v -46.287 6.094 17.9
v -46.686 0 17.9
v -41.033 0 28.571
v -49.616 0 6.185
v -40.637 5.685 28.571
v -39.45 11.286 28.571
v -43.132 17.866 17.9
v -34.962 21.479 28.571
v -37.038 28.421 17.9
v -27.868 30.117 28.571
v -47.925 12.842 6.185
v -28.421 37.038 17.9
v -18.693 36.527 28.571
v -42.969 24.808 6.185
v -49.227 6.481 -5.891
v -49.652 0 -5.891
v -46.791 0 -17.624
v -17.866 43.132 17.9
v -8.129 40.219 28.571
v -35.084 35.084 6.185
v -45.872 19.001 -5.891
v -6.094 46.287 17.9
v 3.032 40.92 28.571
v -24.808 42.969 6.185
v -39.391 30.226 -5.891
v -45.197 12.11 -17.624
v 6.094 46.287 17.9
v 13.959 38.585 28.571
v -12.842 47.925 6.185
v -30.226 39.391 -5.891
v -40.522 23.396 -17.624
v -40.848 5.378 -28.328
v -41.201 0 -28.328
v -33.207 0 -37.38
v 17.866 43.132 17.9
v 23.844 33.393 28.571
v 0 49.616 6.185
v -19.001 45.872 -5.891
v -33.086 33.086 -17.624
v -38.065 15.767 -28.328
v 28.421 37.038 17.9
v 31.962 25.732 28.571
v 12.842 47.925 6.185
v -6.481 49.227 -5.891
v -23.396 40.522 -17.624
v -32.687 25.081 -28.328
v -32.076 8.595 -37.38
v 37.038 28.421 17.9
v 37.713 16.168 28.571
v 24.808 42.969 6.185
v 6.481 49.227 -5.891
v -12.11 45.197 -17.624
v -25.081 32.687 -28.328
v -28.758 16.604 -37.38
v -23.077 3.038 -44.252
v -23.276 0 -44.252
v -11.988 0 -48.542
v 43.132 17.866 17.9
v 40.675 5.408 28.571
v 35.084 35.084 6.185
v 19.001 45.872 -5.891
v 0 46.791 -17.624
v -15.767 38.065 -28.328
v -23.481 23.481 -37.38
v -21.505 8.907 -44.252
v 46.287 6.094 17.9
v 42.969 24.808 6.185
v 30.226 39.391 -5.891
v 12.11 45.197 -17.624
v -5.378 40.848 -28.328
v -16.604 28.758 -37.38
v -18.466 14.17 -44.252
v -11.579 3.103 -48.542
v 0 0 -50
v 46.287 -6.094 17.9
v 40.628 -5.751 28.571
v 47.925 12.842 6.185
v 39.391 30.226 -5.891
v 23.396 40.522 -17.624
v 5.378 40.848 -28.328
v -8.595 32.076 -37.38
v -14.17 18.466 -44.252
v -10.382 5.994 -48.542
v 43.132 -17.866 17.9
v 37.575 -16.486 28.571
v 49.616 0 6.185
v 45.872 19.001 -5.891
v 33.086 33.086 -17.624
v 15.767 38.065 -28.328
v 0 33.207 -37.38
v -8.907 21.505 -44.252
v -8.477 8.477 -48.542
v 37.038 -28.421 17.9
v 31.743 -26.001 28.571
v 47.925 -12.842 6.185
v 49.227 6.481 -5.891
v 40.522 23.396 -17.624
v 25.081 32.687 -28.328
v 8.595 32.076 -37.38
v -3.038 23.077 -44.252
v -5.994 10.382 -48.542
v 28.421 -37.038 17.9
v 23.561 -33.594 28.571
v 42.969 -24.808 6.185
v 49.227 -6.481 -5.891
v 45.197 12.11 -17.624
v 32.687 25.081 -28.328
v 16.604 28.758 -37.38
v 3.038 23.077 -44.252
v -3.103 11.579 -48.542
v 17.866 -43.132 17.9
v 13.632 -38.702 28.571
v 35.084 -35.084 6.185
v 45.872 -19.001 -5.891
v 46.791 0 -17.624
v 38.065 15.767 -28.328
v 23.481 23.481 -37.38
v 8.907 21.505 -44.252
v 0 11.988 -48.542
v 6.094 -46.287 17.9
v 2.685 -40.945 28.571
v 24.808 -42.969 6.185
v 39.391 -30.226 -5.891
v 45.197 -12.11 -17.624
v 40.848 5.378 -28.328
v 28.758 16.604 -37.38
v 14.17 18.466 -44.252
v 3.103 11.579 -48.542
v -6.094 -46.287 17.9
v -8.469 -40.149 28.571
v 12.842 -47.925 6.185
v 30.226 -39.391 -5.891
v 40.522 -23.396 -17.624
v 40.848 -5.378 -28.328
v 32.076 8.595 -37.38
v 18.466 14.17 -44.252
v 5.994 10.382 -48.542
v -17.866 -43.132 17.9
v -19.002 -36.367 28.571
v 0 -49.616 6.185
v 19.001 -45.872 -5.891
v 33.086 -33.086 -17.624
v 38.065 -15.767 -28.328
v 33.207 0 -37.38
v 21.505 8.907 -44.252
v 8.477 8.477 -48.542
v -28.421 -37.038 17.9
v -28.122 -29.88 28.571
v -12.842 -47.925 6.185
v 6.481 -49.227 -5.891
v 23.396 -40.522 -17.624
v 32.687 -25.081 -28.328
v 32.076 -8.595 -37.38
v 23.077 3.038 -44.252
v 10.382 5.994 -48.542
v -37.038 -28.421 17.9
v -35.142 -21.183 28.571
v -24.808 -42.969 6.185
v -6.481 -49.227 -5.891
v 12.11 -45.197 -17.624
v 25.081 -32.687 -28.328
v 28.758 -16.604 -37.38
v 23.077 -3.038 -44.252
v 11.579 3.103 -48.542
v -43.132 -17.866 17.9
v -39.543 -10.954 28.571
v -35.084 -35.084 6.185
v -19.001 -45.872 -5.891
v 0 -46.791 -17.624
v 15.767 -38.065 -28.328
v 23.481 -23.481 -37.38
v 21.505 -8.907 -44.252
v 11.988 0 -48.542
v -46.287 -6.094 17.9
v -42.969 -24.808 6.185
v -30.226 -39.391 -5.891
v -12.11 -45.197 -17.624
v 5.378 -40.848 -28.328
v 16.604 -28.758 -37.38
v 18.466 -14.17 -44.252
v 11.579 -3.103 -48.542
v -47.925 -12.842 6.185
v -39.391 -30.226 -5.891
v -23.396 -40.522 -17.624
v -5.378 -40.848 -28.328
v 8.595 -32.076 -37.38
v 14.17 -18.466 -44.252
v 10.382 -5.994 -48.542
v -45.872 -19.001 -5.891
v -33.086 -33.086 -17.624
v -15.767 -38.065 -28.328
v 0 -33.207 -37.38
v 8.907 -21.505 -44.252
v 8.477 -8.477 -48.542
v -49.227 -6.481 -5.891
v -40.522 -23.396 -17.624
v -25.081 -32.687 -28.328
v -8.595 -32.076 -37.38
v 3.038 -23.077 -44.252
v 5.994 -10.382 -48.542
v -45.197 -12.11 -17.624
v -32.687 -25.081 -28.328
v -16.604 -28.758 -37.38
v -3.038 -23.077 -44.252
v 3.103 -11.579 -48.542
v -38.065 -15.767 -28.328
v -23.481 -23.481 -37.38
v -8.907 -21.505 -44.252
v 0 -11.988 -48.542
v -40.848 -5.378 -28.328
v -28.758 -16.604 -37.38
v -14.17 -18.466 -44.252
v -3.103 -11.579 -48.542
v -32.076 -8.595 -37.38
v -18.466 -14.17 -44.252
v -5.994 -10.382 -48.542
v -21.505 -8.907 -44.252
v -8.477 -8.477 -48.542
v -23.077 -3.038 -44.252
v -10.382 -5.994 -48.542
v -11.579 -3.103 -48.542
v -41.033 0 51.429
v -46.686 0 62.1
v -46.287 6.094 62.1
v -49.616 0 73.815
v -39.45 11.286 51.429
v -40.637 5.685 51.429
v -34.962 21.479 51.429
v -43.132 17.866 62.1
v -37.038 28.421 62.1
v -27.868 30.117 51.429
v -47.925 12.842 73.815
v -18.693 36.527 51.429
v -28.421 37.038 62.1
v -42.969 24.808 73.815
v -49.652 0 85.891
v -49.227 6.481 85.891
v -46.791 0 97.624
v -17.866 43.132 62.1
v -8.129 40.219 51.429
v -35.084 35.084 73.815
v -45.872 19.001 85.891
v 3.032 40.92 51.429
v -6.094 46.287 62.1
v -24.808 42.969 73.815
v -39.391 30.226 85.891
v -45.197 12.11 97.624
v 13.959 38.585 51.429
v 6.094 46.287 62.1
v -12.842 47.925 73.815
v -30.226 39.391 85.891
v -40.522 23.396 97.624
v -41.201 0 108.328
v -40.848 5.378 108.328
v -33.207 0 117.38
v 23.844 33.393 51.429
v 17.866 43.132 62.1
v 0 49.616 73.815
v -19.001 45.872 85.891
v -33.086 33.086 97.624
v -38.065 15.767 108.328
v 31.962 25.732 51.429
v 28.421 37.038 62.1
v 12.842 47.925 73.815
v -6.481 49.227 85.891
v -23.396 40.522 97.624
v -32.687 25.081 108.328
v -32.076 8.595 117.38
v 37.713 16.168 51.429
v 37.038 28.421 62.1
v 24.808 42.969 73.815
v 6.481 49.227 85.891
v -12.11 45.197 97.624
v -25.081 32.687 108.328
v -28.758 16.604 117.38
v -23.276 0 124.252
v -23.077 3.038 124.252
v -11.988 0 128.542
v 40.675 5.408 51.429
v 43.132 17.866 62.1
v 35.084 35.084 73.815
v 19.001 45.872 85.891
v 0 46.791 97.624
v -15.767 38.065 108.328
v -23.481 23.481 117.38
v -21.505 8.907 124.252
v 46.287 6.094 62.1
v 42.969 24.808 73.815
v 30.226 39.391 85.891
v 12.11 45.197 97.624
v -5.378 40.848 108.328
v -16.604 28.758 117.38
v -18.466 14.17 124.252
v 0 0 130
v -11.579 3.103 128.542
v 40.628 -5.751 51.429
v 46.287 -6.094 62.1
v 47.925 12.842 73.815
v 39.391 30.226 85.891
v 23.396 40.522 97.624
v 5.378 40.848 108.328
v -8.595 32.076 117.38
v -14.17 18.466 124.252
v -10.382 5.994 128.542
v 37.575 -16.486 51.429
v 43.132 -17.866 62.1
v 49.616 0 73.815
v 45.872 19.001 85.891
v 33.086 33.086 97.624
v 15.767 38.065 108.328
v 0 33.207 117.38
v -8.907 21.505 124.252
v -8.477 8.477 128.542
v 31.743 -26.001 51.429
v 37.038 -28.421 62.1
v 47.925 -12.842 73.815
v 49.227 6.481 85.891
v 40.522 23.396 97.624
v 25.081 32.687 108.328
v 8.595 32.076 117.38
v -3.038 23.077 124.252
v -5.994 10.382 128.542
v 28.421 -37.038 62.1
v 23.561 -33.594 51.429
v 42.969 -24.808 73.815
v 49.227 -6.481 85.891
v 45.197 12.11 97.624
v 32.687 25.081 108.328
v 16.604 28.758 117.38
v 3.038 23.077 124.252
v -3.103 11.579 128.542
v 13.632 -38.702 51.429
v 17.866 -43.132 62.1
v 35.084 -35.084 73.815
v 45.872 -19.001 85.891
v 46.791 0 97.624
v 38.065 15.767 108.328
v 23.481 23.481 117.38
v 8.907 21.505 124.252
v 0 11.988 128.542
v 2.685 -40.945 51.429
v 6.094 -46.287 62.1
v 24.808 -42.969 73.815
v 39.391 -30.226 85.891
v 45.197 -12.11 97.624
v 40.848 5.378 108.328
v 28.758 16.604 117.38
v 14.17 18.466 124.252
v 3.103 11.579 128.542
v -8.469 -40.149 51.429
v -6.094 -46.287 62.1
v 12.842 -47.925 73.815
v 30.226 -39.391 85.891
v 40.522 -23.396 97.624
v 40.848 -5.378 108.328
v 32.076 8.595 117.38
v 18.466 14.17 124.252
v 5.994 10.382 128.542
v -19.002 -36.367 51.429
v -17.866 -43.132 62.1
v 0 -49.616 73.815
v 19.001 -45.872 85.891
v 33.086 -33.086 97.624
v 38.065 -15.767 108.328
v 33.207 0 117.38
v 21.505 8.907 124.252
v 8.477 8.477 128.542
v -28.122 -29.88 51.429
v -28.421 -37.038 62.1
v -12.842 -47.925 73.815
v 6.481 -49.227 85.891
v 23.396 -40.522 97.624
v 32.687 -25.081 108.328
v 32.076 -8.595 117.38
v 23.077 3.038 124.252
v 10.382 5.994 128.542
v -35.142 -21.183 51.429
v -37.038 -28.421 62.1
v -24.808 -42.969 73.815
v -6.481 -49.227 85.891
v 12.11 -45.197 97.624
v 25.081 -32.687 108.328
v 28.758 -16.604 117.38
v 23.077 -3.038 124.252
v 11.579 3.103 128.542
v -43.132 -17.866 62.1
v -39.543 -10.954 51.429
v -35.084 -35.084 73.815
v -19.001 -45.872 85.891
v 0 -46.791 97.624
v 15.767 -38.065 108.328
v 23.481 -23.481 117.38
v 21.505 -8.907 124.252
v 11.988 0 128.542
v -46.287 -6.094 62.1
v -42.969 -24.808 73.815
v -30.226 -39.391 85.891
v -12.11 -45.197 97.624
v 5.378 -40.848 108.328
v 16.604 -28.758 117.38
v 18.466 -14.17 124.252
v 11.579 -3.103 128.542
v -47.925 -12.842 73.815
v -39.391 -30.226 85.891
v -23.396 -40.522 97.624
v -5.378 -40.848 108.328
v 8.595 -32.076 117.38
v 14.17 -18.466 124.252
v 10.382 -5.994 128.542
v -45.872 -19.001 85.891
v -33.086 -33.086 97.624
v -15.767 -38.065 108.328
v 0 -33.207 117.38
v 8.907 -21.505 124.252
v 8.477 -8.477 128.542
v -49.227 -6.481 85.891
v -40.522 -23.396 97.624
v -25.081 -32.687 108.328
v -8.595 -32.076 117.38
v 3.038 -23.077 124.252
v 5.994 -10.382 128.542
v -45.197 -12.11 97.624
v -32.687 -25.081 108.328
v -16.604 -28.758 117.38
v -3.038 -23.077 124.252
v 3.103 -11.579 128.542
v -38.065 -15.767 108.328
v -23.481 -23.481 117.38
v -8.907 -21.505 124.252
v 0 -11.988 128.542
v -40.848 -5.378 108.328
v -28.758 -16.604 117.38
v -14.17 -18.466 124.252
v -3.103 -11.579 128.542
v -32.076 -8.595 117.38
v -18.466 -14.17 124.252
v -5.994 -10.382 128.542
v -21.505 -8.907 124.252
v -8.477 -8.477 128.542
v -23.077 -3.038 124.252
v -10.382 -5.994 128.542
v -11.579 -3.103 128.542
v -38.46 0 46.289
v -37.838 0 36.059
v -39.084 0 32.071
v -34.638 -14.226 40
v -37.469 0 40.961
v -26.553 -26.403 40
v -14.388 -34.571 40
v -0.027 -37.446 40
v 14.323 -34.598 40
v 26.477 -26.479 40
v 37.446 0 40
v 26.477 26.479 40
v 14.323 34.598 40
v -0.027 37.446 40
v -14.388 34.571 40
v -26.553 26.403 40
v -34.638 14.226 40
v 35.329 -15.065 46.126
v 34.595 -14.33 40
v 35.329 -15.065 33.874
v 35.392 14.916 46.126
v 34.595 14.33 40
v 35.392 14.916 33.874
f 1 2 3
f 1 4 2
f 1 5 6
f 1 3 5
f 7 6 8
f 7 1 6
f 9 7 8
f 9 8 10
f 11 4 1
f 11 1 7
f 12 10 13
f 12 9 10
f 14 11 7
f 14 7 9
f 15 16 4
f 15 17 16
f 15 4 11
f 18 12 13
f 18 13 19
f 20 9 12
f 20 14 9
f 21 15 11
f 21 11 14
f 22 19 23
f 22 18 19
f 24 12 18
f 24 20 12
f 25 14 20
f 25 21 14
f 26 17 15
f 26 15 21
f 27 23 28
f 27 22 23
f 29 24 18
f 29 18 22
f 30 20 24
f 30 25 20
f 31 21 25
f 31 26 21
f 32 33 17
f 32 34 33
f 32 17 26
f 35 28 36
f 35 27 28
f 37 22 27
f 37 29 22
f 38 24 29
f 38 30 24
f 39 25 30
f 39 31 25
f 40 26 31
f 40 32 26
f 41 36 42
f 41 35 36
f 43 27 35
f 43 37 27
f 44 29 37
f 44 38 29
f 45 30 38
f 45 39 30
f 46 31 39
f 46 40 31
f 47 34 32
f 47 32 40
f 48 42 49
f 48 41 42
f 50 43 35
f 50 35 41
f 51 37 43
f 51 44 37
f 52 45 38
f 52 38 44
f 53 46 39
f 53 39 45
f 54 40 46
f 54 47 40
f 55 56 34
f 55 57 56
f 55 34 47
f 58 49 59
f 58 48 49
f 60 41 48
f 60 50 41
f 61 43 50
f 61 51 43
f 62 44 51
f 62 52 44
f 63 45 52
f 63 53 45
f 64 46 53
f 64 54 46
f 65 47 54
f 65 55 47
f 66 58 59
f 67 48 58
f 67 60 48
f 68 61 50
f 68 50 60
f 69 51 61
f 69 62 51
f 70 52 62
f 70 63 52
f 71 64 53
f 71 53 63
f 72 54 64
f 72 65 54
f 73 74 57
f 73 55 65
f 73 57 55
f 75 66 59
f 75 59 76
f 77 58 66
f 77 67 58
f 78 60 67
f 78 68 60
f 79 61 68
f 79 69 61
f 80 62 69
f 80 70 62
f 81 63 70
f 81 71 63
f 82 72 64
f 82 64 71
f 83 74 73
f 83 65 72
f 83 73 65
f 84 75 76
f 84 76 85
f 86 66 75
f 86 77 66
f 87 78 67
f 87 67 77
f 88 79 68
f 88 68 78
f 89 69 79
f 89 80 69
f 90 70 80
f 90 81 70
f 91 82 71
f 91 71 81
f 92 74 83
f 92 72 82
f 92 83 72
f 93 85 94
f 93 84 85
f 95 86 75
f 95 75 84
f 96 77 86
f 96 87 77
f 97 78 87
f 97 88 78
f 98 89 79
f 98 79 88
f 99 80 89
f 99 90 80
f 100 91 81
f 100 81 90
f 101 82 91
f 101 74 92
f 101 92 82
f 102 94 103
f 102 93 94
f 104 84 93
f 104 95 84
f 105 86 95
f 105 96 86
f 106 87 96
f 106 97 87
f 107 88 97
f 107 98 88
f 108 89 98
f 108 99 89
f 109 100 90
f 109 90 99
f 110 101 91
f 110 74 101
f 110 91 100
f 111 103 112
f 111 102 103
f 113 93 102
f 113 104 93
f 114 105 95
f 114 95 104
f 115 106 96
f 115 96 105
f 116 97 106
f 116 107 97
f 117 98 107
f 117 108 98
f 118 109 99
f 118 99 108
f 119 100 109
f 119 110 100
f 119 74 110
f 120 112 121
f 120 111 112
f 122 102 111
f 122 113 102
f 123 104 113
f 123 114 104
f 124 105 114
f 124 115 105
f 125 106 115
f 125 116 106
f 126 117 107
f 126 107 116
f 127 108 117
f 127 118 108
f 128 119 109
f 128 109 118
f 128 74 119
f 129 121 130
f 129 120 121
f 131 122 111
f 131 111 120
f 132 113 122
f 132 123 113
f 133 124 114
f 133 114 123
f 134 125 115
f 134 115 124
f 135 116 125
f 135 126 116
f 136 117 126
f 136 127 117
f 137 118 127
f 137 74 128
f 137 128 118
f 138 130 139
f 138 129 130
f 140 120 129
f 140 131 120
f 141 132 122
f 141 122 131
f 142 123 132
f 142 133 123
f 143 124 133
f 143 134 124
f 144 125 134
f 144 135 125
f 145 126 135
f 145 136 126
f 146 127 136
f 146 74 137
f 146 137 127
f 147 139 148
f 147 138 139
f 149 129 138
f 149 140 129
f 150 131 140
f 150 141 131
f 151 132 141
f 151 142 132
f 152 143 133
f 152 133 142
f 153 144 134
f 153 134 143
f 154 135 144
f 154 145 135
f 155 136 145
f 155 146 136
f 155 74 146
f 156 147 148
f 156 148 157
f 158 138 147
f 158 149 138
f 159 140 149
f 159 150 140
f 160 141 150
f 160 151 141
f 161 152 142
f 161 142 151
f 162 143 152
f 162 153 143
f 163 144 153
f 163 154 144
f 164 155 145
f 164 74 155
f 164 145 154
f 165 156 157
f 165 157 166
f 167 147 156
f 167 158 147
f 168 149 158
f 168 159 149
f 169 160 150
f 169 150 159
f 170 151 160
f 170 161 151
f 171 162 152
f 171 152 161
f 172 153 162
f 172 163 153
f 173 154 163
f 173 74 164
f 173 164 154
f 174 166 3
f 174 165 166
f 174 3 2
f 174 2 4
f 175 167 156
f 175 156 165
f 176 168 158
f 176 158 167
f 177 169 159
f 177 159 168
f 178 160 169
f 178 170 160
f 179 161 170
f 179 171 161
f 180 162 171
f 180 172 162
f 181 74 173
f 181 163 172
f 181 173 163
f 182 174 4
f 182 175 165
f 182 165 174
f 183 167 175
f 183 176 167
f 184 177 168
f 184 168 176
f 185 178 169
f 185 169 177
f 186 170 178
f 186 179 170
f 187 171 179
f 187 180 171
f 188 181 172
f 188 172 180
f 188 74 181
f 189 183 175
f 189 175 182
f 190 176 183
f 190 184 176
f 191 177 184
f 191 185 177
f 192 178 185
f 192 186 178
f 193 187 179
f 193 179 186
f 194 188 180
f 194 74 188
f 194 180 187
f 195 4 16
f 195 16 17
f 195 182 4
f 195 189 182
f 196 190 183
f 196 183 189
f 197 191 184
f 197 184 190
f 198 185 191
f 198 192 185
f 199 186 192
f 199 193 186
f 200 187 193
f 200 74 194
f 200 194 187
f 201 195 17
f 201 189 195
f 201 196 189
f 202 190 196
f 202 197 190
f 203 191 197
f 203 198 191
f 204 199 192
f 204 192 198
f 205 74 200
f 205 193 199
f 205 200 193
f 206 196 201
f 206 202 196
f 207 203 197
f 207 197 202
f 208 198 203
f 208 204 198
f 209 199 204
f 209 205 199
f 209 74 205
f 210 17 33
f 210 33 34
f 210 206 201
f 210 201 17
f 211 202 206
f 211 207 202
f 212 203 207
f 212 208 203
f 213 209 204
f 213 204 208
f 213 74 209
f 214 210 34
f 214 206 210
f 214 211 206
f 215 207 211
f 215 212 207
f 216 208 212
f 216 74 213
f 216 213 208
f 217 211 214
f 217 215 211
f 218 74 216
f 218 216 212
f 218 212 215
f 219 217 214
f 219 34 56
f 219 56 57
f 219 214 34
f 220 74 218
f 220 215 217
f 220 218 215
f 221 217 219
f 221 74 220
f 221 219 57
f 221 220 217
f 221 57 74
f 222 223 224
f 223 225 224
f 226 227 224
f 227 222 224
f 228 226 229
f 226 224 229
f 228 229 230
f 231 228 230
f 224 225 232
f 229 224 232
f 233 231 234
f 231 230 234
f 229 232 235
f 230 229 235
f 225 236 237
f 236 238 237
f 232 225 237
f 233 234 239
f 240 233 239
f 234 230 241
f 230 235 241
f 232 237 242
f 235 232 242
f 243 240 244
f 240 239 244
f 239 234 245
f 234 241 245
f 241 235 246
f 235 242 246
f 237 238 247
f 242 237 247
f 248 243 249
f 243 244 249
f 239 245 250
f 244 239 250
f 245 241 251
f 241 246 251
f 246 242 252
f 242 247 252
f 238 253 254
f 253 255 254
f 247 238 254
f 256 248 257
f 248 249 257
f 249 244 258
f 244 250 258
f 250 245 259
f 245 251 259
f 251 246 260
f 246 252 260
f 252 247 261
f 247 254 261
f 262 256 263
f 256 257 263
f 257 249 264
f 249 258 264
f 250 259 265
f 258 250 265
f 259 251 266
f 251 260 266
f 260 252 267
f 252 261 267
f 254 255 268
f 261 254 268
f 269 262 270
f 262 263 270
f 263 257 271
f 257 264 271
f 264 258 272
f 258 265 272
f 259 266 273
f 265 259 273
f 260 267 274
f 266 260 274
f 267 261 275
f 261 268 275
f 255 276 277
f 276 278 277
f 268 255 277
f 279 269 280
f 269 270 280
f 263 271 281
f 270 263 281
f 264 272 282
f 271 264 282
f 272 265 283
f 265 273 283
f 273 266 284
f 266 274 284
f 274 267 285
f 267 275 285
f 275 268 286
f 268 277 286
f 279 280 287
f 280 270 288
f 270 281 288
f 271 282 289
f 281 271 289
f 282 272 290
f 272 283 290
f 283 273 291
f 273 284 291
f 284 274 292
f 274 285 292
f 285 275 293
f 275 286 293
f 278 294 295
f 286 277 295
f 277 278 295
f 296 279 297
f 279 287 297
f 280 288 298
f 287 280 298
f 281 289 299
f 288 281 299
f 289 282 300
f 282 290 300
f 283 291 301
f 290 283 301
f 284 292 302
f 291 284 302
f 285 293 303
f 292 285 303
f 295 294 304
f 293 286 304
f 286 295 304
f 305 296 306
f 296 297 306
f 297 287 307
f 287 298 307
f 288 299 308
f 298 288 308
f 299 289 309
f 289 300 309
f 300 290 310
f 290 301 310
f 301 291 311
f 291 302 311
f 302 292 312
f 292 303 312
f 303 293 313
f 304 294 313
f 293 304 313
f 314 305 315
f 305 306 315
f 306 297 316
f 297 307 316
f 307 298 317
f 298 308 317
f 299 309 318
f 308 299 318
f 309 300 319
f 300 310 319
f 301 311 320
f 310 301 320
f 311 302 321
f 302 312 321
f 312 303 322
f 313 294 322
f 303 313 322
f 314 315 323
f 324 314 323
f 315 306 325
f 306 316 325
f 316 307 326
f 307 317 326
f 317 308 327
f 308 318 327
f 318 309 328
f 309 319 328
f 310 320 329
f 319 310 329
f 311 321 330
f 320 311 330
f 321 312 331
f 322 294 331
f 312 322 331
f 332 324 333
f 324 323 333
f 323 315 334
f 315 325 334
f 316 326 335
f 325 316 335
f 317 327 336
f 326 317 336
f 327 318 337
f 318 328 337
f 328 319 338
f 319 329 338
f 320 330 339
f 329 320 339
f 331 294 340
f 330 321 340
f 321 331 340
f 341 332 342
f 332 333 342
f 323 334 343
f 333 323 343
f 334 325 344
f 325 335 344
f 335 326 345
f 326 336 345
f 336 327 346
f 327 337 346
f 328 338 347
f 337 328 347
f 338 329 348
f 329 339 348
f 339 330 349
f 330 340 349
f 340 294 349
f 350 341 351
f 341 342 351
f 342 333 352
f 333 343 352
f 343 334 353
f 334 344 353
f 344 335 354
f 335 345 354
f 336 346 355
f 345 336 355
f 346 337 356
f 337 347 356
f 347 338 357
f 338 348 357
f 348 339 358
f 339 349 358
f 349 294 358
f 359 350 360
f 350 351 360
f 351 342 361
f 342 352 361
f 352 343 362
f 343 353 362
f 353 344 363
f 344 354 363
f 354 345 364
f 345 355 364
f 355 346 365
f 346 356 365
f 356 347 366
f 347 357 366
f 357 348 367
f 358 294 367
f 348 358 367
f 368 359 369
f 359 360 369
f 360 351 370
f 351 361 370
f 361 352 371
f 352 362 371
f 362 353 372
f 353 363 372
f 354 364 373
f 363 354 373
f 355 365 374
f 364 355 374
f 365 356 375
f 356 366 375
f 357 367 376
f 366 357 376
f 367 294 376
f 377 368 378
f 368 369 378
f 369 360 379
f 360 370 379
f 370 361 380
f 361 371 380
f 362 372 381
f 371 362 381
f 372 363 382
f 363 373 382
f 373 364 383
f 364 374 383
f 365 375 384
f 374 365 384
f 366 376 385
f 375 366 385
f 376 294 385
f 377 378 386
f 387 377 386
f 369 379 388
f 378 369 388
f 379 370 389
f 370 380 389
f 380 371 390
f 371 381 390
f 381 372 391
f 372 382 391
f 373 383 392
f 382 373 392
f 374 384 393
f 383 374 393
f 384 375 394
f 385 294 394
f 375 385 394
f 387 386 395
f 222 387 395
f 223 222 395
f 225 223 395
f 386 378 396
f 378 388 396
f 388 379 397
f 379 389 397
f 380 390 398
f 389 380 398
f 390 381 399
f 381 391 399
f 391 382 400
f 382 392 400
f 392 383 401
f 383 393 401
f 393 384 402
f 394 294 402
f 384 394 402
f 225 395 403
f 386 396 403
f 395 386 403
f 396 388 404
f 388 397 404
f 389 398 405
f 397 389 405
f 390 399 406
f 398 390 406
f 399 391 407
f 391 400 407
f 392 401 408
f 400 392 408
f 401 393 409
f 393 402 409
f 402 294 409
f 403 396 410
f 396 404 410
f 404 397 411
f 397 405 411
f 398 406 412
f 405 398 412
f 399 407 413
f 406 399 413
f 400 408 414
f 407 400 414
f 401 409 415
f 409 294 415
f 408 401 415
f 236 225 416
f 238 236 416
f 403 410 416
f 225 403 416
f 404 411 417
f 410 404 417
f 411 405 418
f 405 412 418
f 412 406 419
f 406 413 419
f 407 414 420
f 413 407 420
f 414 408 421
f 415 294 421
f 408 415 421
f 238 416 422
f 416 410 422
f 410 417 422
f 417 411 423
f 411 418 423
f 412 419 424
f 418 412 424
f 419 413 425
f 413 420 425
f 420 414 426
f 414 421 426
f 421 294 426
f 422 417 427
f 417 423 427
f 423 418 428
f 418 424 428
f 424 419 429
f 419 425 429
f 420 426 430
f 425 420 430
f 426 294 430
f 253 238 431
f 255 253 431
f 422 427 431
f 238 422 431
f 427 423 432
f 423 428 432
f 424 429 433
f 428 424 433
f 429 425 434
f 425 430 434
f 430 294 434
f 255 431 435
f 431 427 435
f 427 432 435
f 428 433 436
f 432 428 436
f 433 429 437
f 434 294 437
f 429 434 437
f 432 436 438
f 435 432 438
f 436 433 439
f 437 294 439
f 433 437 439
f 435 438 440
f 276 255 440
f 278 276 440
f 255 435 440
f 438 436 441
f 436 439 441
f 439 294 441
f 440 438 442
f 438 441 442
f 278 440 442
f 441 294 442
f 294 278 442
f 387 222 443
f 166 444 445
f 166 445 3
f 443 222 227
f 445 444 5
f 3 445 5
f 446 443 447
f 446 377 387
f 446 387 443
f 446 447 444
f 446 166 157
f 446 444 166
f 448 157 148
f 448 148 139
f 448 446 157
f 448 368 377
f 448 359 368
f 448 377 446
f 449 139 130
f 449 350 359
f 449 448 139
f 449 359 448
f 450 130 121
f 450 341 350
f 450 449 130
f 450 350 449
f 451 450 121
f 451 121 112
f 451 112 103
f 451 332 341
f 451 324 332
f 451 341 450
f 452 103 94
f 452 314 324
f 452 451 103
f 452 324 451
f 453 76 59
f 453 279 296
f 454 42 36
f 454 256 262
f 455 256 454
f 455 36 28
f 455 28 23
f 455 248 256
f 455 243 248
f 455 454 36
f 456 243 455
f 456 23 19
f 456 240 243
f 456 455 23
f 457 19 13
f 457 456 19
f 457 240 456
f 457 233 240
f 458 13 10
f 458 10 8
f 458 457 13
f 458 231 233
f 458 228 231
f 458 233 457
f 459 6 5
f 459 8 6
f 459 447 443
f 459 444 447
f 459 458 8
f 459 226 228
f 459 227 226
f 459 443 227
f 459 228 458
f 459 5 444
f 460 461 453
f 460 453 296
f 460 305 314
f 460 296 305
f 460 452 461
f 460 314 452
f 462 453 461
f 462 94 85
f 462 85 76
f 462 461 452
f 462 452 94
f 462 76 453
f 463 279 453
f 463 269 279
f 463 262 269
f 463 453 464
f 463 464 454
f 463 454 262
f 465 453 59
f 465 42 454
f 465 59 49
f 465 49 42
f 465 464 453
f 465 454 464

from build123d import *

# Parameters (mm, degrees)
F4_R = 20


with BuildPart() as f1:
    # F0 (on Front) → F1 (revolve)
    with BuildSketch(Plane.XZ):
        with BuildLine():
            Line((0, -50), (0, 50))
            ThreePointArc((0, 50), (-50, 0), (0, -50))
        make_face()
    revolve(axis=Axis((0, 0, 0), (0, 0, -1)))

    # F3: F1 across plane


with BuildPart() as f1_1:
    add(f1.part)
    add(f1.part.mirror(Plane.XY.offset(40)))

    # F4
    f4_edges = [f1_1.edges().sort_by_distance(p)[0] for p in [
        (30, 0, 40),
        (-47.434165, 0, -15.811388),
    ]]
    fillet(f4_edges, radius=F4_R)


solid = f1_1.part
